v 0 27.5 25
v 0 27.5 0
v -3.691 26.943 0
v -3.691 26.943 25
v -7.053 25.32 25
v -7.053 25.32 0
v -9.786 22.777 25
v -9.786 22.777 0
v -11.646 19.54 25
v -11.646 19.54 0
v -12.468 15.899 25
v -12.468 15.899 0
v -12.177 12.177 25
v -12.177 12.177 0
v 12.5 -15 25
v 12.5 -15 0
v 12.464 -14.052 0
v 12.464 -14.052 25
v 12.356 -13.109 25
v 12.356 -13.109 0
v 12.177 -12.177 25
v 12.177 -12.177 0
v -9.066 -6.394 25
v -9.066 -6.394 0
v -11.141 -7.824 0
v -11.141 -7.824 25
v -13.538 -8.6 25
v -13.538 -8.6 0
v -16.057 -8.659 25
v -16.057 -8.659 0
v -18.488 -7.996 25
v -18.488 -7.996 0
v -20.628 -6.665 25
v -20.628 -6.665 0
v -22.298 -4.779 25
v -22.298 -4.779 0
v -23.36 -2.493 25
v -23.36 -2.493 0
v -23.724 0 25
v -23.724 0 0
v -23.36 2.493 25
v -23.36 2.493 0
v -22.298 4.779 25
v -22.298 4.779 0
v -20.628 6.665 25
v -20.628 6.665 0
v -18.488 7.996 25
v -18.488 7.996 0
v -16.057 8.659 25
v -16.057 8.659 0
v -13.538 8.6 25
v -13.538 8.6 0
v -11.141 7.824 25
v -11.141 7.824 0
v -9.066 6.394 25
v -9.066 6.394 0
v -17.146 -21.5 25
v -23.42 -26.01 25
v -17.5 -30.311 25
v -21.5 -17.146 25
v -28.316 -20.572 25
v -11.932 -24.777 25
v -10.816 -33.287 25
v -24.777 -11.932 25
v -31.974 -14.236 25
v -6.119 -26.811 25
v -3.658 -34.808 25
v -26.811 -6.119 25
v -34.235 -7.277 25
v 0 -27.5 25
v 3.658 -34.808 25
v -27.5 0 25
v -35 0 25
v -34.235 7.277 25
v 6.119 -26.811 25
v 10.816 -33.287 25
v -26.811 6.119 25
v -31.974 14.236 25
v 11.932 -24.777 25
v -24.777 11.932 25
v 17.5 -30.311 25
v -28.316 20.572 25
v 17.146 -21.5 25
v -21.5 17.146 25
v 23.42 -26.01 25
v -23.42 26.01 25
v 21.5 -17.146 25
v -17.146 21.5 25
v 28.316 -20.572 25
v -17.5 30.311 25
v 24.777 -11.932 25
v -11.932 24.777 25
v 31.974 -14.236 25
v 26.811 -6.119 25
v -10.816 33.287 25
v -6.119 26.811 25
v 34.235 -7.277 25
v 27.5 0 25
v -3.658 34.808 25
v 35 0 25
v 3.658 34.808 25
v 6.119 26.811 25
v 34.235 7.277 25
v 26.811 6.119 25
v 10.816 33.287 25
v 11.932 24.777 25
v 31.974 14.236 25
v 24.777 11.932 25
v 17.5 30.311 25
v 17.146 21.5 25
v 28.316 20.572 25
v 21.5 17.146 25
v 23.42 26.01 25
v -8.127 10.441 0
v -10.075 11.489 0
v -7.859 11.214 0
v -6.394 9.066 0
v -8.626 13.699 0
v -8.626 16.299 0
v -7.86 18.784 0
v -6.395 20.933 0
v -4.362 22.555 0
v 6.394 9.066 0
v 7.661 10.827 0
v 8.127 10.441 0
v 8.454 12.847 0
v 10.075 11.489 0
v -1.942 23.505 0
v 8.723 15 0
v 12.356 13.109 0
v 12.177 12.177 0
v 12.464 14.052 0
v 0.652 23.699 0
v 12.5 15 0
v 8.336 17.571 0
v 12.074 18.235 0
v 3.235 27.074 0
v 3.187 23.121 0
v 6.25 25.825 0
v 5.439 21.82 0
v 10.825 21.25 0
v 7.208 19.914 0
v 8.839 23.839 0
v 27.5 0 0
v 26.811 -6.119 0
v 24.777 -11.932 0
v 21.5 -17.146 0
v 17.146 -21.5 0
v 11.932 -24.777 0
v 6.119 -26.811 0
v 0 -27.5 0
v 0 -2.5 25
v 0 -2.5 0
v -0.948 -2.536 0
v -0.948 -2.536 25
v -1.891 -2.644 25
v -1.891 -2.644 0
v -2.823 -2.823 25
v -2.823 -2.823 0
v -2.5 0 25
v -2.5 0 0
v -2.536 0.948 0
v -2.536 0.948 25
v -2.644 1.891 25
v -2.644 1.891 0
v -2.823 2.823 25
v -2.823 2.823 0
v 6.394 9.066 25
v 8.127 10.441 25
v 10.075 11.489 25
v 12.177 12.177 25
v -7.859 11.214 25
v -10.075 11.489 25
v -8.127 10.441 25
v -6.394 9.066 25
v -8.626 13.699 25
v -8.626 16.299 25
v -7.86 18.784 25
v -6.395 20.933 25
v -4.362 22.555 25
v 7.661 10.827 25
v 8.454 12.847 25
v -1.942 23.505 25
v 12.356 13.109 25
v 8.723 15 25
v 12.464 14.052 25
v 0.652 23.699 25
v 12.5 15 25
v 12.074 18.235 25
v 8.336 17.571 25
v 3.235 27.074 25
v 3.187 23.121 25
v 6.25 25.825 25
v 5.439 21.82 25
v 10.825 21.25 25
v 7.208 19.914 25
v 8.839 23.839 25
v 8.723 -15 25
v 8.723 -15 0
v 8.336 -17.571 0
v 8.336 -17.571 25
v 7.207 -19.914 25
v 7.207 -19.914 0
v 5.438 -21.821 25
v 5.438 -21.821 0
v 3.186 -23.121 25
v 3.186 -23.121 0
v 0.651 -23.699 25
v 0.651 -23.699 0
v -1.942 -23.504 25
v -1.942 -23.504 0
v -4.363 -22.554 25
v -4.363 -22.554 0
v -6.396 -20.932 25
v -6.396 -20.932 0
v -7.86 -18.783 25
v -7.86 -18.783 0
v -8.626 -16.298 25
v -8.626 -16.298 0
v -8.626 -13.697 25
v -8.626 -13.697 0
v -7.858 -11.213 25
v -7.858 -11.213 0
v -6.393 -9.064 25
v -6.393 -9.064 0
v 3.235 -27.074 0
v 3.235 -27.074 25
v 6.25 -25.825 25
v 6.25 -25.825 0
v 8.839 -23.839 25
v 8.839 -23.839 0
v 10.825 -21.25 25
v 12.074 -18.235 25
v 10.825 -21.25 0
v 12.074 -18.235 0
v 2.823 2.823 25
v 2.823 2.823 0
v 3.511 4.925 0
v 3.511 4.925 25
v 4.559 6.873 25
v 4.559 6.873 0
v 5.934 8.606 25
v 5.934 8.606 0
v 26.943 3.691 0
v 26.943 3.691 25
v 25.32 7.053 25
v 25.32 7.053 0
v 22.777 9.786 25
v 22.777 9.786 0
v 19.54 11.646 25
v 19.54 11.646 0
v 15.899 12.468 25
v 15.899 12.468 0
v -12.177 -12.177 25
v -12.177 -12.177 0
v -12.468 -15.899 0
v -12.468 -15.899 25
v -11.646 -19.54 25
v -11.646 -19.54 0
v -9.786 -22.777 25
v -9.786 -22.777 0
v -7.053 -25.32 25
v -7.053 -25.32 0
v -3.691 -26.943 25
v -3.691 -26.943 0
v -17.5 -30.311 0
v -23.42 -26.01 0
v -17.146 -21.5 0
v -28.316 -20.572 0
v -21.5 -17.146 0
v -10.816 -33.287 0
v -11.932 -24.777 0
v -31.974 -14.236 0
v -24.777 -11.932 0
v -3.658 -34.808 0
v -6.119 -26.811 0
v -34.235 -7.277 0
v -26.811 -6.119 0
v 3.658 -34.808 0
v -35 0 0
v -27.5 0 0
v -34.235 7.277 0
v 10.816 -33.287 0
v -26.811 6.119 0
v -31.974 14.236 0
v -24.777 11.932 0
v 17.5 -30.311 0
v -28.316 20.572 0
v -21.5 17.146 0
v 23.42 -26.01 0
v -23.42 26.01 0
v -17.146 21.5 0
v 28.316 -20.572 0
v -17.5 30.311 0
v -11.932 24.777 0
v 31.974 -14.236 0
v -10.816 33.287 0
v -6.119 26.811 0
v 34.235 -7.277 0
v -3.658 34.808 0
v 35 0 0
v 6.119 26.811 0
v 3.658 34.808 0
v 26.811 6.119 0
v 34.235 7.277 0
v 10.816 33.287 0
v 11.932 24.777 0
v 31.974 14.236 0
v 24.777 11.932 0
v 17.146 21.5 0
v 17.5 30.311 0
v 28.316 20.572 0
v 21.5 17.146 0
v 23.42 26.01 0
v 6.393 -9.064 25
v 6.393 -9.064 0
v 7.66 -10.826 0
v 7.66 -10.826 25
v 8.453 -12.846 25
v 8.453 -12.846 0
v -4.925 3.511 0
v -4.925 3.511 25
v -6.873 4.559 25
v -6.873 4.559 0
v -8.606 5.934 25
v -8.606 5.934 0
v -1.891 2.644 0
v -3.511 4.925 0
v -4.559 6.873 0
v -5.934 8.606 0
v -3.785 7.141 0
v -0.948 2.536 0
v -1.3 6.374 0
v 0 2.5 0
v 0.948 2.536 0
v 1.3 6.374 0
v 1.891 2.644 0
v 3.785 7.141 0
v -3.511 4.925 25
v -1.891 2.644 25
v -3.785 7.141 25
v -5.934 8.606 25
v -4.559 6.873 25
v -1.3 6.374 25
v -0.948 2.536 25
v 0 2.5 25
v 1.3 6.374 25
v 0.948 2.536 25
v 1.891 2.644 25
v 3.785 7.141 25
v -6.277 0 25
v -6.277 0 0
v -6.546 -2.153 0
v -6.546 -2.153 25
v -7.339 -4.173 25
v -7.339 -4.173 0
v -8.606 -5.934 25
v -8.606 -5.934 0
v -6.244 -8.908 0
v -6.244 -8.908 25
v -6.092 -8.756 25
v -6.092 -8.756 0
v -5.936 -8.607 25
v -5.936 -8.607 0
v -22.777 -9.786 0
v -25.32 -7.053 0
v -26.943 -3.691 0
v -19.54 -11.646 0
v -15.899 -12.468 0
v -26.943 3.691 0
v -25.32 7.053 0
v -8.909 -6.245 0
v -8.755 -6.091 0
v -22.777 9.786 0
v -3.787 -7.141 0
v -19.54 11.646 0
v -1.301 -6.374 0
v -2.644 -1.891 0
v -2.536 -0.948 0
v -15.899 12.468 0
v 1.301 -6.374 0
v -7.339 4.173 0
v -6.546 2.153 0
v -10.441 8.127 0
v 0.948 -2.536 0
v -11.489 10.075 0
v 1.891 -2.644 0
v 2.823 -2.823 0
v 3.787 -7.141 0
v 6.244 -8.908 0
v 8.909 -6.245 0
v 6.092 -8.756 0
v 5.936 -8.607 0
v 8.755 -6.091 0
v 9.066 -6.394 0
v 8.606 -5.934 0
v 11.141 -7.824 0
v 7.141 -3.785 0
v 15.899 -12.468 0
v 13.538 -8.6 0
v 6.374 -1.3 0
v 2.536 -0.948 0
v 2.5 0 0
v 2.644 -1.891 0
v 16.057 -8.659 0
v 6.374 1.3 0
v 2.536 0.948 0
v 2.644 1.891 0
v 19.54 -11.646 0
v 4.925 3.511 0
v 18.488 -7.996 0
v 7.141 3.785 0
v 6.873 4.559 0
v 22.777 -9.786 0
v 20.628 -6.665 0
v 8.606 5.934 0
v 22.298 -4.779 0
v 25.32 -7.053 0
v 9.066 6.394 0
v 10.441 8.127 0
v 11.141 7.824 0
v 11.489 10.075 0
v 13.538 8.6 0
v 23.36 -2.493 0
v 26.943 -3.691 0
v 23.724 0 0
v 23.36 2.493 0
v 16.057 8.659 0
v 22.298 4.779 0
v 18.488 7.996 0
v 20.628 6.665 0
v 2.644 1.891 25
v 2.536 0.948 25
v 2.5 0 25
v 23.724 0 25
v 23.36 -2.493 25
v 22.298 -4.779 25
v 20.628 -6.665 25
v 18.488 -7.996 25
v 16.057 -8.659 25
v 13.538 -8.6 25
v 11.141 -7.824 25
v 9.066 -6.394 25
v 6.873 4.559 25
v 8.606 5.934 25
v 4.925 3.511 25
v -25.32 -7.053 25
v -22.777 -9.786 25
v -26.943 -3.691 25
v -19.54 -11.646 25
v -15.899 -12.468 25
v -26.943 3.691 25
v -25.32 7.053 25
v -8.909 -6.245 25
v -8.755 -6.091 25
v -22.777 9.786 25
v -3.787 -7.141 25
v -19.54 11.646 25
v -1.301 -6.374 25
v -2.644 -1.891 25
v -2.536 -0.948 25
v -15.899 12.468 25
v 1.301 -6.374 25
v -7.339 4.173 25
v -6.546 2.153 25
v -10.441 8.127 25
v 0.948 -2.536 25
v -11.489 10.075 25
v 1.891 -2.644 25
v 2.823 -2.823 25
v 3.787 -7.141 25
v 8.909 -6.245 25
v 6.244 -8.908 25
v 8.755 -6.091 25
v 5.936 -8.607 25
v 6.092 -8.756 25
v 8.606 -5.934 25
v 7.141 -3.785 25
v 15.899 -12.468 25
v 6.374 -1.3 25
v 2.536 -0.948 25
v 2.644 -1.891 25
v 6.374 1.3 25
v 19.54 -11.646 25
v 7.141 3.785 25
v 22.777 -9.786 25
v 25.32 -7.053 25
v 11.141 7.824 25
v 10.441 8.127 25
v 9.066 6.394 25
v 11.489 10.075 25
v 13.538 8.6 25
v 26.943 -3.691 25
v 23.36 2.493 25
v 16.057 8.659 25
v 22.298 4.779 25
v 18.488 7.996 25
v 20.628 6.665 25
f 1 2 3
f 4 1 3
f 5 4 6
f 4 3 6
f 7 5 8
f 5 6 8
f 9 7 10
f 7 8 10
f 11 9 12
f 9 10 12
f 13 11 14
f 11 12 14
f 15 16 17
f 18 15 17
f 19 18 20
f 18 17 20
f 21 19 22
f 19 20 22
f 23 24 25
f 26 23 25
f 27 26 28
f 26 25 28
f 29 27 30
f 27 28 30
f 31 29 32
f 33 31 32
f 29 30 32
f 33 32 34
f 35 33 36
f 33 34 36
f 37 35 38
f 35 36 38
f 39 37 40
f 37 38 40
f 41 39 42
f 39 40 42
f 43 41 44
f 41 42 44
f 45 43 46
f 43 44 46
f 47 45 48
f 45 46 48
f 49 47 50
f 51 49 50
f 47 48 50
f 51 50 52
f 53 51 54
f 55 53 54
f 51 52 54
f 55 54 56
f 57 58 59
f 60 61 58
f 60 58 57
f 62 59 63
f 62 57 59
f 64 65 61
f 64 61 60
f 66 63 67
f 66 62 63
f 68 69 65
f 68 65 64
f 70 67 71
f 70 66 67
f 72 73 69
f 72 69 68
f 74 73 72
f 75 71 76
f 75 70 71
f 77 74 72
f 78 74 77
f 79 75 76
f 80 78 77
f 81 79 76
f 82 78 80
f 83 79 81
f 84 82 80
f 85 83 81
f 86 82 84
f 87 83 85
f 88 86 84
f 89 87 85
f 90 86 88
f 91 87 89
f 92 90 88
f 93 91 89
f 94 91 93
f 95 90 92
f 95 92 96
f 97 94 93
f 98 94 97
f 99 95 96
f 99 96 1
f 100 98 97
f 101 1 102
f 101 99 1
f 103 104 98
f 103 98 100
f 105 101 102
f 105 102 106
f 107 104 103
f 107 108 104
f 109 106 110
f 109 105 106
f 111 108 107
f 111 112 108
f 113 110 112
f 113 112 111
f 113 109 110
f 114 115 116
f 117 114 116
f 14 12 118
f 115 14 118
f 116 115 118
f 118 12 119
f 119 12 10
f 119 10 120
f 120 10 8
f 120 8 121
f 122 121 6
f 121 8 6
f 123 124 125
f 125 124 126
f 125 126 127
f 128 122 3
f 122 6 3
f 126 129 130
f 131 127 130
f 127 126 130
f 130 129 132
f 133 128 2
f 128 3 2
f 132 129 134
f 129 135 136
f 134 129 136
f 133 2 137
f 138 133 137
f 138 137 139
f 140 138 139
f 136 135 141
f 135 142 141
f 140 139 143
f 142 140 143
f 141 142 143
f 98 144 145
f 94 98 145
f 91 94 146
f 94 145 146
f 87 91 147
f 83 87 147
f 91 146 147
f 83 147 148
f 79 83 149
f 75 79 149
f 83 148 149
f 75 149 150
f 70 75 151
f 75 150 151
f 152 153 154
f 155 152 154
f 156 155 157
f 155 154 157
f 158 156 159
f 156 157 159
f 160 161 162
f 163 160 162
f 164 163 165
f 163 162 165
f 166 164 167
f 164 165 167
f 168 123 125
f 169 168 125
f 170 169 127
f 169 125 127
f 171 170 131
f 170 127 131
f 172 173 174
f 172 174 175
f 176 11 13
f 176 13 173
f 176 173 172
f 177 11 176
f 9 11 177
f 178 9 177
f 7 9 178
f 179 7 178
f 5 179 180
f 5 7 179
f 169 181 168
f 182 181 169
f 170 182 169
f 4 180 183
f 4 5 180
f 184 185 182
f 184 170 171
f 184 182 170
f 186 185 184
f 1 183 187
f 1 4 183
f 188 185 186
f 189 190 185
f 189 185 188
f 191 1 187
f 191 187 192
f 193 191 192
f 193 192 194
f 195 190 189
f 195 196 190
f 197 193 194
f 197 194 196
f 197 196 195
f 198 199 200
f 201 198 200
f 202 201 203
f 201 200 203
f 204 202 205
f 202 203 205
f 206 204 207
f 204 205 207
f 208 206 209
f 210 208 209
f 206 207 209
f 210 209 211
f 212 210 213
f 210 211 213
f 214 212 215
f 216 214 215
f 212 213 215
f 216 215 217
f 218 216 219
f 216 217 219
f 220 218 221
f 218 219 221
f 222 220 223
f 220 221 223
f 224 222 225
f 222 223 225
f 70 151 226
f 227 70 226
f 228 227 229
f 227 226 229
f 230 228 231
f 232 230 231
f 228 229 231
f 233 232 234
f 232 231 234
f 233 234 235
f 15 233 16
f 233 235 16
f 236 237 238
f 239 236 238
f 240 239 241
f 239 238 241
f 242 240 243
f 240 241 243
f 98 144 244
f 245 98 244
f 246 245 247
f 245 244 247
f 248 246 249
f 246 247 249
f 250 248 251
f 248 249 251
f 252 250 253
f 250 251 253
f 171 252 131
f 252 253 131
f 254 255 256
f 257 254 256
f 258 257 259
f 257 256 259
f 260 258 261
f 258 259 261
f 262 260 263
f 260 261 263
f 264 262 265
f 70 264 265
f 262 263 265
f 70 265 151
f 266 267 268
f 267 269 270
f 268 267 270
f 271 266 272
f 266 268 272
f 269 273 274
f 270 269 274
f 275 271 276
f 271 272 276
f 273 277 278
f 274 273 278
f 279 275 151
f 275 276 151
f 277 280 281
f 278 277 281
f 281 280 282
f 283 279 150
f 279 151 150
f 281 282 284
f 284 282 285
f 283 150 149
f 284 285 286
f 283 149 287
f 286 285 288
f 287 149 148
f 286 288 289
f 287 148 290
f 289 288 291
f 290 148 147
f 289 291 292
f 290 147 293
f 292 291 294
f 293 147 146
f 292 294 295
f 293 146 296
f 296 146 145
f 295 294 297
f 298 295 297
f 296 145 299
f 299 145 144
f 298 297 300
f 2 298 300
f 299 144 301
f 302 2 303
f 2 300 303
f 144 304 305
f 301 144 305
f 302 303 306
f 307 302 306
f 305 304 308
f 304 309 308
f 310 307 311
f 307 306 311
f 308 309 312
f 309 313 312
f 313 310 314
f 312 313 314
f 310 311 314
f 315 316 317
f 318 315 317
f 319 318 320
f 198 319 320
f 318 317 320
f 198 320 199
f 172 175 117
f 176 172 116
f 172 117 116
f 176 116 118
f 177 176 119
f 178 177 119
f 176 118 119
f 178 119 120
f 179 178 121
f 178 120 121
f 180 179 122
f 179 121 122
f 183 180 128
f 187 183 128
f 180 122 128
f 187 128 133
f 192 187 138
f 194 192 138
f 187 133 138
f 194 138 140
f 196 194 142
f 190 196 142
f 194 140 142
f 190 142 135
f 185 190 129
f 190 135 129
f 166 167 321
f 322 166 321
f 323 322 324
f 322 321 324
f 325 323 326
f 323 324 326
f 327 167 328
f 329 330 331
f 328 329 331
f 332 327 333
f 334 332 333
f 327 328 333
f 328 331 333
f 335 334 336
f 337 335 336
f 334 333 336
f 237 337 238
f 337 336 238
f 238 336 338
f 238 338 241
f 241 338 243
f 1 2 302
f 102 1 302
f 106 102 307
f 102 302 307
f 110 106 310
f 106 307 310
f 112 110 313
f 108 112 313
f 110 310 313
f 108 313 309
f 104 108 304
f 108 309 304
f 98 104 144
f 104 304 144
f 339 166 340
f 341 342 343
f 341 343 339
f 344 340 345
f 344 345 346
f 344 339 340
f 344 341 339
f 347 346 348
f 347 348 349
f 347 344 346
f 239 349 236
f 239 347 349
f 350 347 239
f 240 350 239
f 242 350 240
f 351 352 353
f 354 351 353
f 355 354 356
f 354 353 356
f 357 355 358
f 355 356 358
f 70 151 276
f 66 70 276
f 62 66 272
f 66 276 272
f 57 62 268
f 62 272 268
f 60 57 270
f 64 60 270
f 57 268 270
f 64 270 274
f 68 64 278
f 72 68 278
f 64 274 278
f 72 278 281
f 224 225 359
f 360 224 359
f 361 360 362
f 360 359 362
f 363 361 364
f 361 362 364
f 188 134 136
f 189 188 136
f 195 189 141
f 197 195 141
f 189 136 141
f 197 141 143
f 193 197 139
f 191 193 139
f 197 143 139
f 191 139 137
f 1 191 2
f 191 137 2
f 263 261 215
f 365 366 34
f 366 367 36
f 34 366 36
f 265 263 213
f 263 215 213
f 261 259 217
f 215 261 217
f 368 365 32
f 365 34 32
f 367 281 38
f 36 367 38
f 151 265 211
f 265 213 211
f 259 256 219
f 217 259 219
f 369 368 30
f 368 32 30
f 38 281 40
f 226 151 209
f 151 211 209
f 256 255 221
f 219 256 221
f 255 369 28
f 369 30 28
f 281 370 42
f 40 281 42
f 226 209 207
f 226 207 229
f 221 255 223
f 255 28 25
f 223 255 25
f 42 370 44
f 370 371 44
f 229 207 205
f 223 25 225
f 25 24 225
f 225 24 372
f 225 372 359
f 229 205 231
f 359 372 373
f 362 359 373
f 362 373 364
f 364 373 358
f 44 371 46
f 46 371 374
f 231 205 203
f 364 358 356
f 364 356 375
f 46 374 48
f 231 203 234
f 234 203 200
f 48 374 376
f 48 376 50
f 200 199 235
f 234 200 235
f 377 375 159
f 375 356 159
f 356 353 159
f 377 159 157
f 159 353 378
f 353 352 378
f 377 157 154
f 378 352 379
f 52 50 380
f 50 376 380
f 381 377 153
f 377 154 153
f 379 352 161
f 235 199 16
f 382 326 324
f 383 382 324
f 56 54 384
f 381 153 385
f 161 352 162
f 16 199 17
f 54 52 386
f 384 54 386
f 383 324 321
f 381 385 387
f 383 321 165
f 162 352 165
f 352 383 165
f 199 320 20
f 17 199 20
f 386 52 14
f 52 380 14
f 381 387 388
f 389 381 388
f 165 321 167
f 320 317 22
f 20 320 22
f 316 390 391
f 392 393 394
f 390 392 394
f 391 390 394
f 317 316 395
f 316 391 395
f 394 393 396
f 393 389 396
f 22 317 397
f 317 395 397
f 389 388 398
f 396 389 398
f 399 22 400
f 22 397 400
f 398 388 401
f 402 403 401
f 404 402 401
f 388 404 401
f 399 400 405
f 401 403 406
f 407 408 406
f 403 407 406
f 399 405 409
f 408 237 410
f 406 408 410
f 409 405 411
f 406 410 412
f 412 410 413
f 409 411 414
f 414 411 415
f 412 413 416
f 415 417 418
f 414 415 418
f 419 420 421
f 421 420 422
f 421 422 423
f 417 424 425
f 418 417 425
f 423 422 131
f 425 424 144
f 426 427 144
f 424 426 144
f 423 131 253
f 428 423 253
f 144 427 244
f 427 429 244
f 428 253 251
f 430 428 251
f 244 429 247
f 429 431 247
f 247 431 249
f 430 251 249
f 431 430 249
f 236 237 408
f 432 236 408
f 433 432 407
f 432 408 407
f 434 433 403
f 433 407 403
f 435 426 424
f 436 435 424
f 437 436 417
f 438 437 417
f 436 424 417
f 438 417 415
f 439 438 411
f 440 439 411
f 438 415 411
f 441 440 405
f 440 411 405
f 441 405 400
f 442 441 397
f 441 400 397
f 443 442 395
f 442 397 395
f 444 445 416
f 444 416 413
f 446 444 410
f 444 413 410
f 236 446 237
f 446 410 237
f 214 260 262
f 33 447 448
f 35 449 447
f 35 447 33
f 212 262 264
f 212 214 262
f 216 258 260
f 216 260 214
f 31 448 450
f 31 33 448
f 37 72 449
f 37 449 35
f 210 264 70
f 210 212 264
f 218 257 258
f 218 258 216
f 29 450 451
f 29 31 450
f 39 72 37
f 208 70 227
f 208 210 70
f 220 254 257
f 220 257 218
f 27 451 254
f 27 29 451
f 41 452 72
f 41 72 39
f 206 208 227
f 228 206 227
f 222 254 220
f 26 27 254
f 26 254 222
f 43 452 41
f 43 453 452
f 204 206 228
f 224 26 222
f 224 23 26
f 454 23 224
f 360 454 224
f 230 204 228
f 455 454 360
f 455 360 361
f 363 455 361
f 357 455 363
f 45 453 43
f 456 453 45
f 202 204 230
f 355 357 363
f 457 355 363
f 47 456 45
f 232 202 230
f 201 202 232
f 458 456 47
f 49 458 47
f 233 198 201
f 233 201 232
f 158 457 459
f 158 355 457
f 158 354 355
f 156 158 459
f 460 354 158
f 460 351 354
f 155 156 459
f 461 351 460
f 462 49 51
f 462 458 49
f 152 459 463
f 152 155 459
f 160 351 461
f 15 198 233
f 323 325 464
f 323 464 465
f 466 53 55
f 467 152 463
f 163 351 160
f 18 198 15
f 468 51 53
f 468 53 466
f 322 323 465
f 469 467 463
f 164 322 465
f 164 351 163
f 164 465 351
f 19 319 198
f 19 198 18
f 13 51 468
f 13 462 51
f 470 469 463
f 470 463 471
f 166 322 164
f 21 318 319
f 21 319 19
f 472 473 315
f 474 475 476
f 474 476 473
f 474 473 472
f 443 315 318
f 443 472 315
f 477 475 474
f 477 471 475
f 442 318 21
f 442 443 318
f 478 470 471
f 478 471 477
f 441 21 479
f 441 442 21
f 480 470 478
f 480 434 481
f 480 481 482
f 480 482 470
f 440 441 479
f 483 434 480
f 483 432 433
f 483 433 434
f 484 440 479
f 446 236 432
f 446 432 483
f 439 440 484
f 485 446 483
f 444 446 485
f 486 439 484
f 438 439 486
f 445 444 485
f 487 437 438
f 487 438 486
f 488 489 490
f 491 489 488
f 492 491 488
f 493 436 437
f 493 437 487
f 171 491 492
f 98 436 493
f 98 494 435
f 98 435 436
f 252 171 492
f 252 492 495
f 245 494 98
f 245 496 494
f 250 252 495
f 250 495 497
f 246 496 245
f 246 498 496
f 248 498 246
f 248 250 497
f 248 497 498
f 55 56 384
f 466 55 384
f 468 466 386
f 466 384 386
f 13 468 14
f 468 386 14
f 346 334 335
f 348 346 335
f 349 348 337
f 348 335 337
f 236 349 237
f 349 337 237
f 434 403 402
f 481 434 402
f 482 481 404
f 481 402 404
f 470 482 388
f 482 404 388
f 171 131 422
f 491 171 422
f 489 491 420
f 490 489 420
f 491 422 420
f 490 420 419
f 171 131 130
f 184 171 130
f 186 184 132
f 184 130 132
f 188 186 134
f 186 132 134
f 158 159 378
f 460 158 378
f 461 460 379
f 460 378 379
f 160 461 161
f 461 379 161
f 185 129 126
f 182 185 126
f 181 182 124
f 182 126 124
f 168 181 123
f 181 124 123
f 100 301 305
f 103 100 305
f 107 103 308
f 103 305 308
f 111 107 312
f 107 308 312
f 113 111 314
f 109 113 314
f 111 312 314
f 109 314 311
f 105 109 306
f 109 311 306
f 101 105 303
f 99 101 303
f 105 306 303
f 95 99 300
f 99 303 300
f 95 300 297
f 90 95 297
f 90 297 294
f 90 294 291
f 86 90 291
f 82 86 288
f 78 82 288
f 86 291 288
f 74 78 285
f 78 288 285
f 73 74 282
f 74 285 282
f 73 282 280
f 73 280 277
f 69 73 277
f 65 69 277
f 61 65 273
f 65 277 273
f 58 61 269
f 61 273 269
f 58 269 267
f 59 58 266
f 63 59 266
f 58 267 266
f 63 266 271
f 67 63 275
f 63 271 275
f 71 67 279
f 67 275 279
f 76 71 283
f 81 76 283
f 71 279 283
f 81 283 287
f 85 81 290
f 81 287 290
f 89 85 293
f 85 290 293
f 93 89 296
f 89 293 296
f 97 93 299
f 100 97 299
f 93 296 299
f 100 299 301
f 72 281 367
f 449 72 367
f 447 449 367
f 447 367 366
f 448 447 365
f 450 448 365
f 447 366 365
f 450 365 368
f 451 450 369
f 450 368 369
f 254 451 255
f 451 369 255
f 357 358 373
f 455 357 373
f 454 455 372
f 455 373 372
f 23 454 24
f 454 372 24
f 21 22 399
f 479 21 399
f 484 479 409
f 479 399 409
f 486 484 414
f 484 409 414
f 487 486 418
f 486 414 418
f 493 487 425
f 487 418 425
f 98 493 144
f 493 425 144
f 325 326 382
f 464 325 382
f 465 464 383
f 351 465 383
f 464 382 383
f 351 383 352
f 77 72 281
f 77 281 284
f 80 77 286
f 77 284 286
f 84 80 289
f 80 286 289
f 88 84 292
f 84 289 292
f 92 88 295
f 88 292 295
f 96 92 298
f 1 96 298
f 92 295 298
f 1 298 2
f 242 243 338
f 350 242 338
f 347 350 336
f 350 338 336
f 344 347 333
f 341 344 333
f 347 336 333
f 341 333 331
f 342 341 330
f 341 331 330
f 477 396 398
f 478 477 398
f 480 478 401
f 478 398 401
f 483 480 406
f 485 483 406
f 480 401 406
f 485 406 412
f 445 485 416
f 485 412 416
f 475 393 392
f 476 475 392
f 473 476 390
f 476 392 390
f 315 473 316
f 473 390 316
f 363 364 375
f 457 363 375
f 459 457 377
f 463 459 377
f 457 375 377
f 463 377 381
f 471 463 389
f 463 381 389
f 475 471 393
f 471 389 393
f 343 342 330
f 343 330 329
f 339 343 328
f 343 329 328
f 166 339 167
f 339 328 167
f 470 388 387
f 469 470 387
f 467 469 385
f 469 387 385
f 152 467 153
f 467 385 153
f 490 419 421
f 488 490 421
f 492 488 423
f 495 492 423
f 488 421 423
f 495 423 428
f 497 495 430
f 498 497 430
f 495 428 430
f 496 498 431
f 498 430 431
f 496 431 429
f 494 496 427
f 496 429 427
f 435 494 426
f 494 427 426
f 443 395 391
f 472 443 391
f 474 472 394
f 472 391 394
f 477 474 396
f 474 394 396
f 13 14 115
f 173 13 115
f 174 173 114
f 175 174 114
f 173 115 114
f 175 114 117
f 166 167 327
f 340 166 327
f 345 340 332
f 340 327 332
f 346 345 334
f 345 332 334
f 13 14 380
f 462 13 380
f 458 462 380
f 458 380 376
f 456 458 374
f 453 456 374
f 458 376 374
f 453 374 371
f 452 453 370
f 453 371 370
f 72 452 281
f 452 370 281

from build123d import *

# Parameters (mm, degrees)
F0_R     = 35
F1_DEPTH = 25


with BuildPart() as f1:
    # F0 (on Top) → F1 (new body)
    with BuildSketch(Plane.XY):
        Circle(F0_R)
        with BuildLine():
            ThreePointArc((0, 27.5), (19.4454364826, 19.4454364826), (27.5, 0))
            ThreePointArc((27.5, 0), (19.4454364306, -19.4454365347), (-1.472e-07, -27.5))
            ThreePointArc((-1.472e-07, -27.5), (-19.4454365274, -19.4454364378), (-27.5, -2.06e-08))
            ThreePointArc((-27.5, -2.06e-08), (-19.4454364899, 19.4454364754), (0, 27.5))
        make_face(mode=Mode.SUBTRACT)
    extrude(amount=F1_DEPTH)


with BuildPart() as f1b:
    # F0 (on Top) → F1, piece 2 (new body)
    with BuildSketch(Plane.XY):
        with BuildLine():
            ThreePointArc((-12.1770717335, 12.1770717335), (-22.7769980365, 9.7861280157), (-27.5, -2.06e-08))
            ThreePointArc((-27.5, -2.06e-08), (-22.7769980204, -9.7861280285), (-12.1770717335, -12.1770717335))
            ThreePointArc((-12.1770717335, -12.1770717335), (-11.0079822401, -9.0776417703), (-9.065816326, -6.394131401))
            ThreePointArc((-9.065816326, -6.394131401), (-23.7235, 0), (-9.065816326, 6.394131401))
            ThreePointArc((-9.065816326, 6.394131401), (-11.0079822401, 9.0776417703), (-12.1770717335, 12.1770717335))
        make_face()
        with BuildLine():
            ThreePointArc((-12.1770717335, -12.1770717335), (-9.7861280679, -22.7769979708), (-1.472e-07, -27.5))
            ThreePointArc((-1.472e-07, -27.5), (8.8388347128, -23.8388348169), (12.5, -15))
            ThreePointArc((12.5, -15), (12.4190055292, -13.5793305572), (12.1770717335, -12.1770717335))
            ThreePointArc((12.1770717335, -12.1770717335), (9.0767385281, -11.0074962428), (6.3926437223, -9.0644038915))
            ThreePointArc((6.3926437223, -9.0644038915), (8.1198089674, -11.8115995773), (8.7233706171, -15))
            ThreePointArc((8.7233706171, -15), (-3.1884004227, -23.1198089674), (-6.3926437223, -9.0644038915))
            ThreePointArc((-6.3926437223, -9.0644038915), (-9.0767385281, -11.0074962428), (-12.1770717335, -12.1770717335))
        make_face()
        with BuildLine():
            ThreePointArc((-9.065816326, -6.394131401), (-11.0079822401, -9.0776417703), (-12.1770717335, -12.1770717335))
            ThreePointArc((-12.1770717335, -12.1770717335), (-9.0767385281, -11.0074962428), (-6.3926437223, -9.0644038915))
            ThreePointArc((-6.3926437223, -9.0644038915), (-6.1683545181, -8.8316454819), (-5.9355961085, -8.6073562777))
            ThreePointArc((-5.9355961085, -8.6073562777), (-3.9925037572, -5.9232614719), (-2.8229282665, -2.8229282665))
            ThreePointArc((-2.8229282665, -2.8229282665), (-5.9223582297, -3.9920177599), (-8.605868599, -5.934183674))
            ThreePointArc((-8.605868599, -5.934183674), (-8.8315539943, -6.1684460057), (-9.065816326, -6.394131401))
        make_face()
        with BuildLine():
            ThreePointArc((-2.8229282665, 2.8229282665), (-5.9223582297, 3.9920177599), (-8.605868599, 5.934183674))
            ThreePointArc((-8.605868599, 5.934183674), (-6.8796965104, 3.1874948607), (-6.2765, 0))
            ThreePointArc((-6.2765, 0), (-6.8796965104, -3.1874948607), (-8.605868599, -5.934183674))
            ThreePointArc((-8.605868599, -5.934183674), (-5.9223582297, -3.9920177599), (-2.8229282665, -2.8229282665))
            ThreePointArc((-2.8229282665, -2.8229282665), (-2.5809944708, -1.4206694428), (-2.5, 0))
            ThreePointArc((-2.5, 0), (-2.5809944708, 1.4206694428), (-2.8229282665, 2.8229282665))
        make_face()
        with BuildLine():
            ThreePointArc((-5.9355961085, -8.6073562777), (0, -6.2766293829), (5.9355961085, -8.6073562777))
            ThreePointArc((5.9355961085, -8.6073562777), (3.9925037572, -5.9232614719), (2.8229282665, -2.8229282665))
            ThreePointArc((2.8229282665, -2.8229282665), (1.4206694428, -2.5809944708), (0, -2.5))
            ThreePointArc((0, -2.5), (-1.4206694428, -2.5809944708), (-2.8229282665, -2.8229282665))
            ThreePointArc((-2.8229282665, -2.8229282665), (-3.9925037572, -5.9232614719), (-5.9355961085, -8.6073562777))
        make_face()
        with BuildLine():
            ThreePointArc((6.3926437223, -9.0644038915), (9.0767385281, -11.0074962428), (12.1770717335, -12.1770717335))
            ThreePointArc((12.1770717335, -12.1770717335), (11.0079822401, -9.0776417703), (9.065816326, -6.394131401))
            ThreePointArc((9.065816326, -6.394131401), (8.8315539943, -6.1684460057), (8.605868599, -5.934183674))
            ThreePointArc((8.605868599, -5.934183674), (5.9223582297, -3.9920177599), (2.8229282665, -2.8229282665))
            ThreePointArc((2.8229282665, -2.8229282665), (3.9925037572, -5.9232614719), (5.9355961085, -8.6073562777))
            ThreePointArc((5.9355961085, -8.6073562777), (6.1683545181, -8.8316454819), (6.3926437223, -9.0644038915))
        make_face()
        with BuildLine():
            ThreePointArc((8.605868599, -5.934183674), (6.2765, 0), (8.605868599, 5.934183674))
            ThreePointArc((8.605868599, 5.934183674), (5.9223582297, 3.9920177599), (2.8229282665, 2.8229282665))
            ThreePointArc((2.8229282665, 2.8229282665), (2.5809944708, 1.4206694428), (2.5, 0))
            ThreePointArc((2.5, 0), (2.5809944708, -1.4206694428), (2.8229282665, -2.8229282665))
            ThreePointArc((2.8229282665, -2.8229282665), (5.9223582297, -3.9920177599), (8.605868599, -5.934183674))
        make_face()
        with BuildLine():
            ThreePointArc((12.1770717335, -12.1770717335), (22.7769980284, -9.7861280221), (27.5, 0))
            ThreePointArc((27.5, 0), (22.7769980284, 9.7861280221), (12.1770717335, 12.1770717335))
            ThreePointArc((12.1770717335, 12.1770717335), (11.0079822401, 9.0776417703), (9.065816326, 6.394131401))
            ThreePointArc((9.065816326, 6.394131401), (18.4880224318, 7.9958208938), (23.7235, 0))
            ThreePointArc((23.7235, 0), (18.4880224318, -7.9958208938), (9.065816326, -6.394131401))
            ThreePointArc((9.065816326, -6.394131401), (11.0079822401, -9.0776417703), (12.1770717335, -12.1770717335))
        make_face()
    extrude(amount=F1_DEPTH)


with BuildPart() as f1c:
    # F0 (on Top) → F1, piece 3 (new body)
    with BuildSketch(Plane.XY):
        with BuildLine():
            ThreePointArc((2.8229282665, 2.8229282665), (3.9920177599, 5.9223582297), (5.934183674, 8.605868599))
            ThreePointArc((5.934183674, 8.605868599), (0, 6.2765), (-5.934183674, 8.605868599))
            ThreePointArc((-5.934183674, 8.605868599), (-3.9920177599, 5.9223582297), (-2.8229282665, 2.8229282665))
            ThreePointArc((-2.8229282665, 2.8229282665), (-1.4206694428, 2.5809944708), (0, 2.5))
            ThreePointArc((0, 2.5), (1.4206694428, 2.5809944708), (2.8229282665, 2.8229282665))
        make_face()
    extrude(amount=F1_DEPTH)


with BuildPart() as f1d:
    # F0 (on Top) → F1, piece 4 (new body)
    with BuildSketch(Plane.XY):
        with BuildLine():
            ThreePointArc((12.5, 15), (8.8388347648, 23.8388347648), (0, 27.5))
            ThreePointArc((0, 27.5), (-9.7861280221, 22.7769980284), (-12.1770717335, 12.1770717335))
            ThreePointArc((-12.1770717335, 12.1770717335), (-9.0776417703, 11.0079822401), (-6.394131401, 9.065816326))
            ThreePointArc((-6.394131401, 9.065816326), (-3.1874948607, 23.1203034896), (8.7235, 15))
            ThreePointArc((8.7235, 15), (8.1203034896, 11.8125051393), (6.394131401, 9.065816326))
            ThreePointArc((6.394131401, 9.065816326), (9.0776417703, 11.0079822401), (12.1770717335, 12.1770717335))
            ThreePointArc((12.1770717335, 12.1770717335), (12.4190055292, 13.5793305572), (12.5, 15))
        make_face()
    extrude(amount=F1_DEPTH)


solid = Compound([f1.part, f1b.part, f1c.part, f1d.part])
